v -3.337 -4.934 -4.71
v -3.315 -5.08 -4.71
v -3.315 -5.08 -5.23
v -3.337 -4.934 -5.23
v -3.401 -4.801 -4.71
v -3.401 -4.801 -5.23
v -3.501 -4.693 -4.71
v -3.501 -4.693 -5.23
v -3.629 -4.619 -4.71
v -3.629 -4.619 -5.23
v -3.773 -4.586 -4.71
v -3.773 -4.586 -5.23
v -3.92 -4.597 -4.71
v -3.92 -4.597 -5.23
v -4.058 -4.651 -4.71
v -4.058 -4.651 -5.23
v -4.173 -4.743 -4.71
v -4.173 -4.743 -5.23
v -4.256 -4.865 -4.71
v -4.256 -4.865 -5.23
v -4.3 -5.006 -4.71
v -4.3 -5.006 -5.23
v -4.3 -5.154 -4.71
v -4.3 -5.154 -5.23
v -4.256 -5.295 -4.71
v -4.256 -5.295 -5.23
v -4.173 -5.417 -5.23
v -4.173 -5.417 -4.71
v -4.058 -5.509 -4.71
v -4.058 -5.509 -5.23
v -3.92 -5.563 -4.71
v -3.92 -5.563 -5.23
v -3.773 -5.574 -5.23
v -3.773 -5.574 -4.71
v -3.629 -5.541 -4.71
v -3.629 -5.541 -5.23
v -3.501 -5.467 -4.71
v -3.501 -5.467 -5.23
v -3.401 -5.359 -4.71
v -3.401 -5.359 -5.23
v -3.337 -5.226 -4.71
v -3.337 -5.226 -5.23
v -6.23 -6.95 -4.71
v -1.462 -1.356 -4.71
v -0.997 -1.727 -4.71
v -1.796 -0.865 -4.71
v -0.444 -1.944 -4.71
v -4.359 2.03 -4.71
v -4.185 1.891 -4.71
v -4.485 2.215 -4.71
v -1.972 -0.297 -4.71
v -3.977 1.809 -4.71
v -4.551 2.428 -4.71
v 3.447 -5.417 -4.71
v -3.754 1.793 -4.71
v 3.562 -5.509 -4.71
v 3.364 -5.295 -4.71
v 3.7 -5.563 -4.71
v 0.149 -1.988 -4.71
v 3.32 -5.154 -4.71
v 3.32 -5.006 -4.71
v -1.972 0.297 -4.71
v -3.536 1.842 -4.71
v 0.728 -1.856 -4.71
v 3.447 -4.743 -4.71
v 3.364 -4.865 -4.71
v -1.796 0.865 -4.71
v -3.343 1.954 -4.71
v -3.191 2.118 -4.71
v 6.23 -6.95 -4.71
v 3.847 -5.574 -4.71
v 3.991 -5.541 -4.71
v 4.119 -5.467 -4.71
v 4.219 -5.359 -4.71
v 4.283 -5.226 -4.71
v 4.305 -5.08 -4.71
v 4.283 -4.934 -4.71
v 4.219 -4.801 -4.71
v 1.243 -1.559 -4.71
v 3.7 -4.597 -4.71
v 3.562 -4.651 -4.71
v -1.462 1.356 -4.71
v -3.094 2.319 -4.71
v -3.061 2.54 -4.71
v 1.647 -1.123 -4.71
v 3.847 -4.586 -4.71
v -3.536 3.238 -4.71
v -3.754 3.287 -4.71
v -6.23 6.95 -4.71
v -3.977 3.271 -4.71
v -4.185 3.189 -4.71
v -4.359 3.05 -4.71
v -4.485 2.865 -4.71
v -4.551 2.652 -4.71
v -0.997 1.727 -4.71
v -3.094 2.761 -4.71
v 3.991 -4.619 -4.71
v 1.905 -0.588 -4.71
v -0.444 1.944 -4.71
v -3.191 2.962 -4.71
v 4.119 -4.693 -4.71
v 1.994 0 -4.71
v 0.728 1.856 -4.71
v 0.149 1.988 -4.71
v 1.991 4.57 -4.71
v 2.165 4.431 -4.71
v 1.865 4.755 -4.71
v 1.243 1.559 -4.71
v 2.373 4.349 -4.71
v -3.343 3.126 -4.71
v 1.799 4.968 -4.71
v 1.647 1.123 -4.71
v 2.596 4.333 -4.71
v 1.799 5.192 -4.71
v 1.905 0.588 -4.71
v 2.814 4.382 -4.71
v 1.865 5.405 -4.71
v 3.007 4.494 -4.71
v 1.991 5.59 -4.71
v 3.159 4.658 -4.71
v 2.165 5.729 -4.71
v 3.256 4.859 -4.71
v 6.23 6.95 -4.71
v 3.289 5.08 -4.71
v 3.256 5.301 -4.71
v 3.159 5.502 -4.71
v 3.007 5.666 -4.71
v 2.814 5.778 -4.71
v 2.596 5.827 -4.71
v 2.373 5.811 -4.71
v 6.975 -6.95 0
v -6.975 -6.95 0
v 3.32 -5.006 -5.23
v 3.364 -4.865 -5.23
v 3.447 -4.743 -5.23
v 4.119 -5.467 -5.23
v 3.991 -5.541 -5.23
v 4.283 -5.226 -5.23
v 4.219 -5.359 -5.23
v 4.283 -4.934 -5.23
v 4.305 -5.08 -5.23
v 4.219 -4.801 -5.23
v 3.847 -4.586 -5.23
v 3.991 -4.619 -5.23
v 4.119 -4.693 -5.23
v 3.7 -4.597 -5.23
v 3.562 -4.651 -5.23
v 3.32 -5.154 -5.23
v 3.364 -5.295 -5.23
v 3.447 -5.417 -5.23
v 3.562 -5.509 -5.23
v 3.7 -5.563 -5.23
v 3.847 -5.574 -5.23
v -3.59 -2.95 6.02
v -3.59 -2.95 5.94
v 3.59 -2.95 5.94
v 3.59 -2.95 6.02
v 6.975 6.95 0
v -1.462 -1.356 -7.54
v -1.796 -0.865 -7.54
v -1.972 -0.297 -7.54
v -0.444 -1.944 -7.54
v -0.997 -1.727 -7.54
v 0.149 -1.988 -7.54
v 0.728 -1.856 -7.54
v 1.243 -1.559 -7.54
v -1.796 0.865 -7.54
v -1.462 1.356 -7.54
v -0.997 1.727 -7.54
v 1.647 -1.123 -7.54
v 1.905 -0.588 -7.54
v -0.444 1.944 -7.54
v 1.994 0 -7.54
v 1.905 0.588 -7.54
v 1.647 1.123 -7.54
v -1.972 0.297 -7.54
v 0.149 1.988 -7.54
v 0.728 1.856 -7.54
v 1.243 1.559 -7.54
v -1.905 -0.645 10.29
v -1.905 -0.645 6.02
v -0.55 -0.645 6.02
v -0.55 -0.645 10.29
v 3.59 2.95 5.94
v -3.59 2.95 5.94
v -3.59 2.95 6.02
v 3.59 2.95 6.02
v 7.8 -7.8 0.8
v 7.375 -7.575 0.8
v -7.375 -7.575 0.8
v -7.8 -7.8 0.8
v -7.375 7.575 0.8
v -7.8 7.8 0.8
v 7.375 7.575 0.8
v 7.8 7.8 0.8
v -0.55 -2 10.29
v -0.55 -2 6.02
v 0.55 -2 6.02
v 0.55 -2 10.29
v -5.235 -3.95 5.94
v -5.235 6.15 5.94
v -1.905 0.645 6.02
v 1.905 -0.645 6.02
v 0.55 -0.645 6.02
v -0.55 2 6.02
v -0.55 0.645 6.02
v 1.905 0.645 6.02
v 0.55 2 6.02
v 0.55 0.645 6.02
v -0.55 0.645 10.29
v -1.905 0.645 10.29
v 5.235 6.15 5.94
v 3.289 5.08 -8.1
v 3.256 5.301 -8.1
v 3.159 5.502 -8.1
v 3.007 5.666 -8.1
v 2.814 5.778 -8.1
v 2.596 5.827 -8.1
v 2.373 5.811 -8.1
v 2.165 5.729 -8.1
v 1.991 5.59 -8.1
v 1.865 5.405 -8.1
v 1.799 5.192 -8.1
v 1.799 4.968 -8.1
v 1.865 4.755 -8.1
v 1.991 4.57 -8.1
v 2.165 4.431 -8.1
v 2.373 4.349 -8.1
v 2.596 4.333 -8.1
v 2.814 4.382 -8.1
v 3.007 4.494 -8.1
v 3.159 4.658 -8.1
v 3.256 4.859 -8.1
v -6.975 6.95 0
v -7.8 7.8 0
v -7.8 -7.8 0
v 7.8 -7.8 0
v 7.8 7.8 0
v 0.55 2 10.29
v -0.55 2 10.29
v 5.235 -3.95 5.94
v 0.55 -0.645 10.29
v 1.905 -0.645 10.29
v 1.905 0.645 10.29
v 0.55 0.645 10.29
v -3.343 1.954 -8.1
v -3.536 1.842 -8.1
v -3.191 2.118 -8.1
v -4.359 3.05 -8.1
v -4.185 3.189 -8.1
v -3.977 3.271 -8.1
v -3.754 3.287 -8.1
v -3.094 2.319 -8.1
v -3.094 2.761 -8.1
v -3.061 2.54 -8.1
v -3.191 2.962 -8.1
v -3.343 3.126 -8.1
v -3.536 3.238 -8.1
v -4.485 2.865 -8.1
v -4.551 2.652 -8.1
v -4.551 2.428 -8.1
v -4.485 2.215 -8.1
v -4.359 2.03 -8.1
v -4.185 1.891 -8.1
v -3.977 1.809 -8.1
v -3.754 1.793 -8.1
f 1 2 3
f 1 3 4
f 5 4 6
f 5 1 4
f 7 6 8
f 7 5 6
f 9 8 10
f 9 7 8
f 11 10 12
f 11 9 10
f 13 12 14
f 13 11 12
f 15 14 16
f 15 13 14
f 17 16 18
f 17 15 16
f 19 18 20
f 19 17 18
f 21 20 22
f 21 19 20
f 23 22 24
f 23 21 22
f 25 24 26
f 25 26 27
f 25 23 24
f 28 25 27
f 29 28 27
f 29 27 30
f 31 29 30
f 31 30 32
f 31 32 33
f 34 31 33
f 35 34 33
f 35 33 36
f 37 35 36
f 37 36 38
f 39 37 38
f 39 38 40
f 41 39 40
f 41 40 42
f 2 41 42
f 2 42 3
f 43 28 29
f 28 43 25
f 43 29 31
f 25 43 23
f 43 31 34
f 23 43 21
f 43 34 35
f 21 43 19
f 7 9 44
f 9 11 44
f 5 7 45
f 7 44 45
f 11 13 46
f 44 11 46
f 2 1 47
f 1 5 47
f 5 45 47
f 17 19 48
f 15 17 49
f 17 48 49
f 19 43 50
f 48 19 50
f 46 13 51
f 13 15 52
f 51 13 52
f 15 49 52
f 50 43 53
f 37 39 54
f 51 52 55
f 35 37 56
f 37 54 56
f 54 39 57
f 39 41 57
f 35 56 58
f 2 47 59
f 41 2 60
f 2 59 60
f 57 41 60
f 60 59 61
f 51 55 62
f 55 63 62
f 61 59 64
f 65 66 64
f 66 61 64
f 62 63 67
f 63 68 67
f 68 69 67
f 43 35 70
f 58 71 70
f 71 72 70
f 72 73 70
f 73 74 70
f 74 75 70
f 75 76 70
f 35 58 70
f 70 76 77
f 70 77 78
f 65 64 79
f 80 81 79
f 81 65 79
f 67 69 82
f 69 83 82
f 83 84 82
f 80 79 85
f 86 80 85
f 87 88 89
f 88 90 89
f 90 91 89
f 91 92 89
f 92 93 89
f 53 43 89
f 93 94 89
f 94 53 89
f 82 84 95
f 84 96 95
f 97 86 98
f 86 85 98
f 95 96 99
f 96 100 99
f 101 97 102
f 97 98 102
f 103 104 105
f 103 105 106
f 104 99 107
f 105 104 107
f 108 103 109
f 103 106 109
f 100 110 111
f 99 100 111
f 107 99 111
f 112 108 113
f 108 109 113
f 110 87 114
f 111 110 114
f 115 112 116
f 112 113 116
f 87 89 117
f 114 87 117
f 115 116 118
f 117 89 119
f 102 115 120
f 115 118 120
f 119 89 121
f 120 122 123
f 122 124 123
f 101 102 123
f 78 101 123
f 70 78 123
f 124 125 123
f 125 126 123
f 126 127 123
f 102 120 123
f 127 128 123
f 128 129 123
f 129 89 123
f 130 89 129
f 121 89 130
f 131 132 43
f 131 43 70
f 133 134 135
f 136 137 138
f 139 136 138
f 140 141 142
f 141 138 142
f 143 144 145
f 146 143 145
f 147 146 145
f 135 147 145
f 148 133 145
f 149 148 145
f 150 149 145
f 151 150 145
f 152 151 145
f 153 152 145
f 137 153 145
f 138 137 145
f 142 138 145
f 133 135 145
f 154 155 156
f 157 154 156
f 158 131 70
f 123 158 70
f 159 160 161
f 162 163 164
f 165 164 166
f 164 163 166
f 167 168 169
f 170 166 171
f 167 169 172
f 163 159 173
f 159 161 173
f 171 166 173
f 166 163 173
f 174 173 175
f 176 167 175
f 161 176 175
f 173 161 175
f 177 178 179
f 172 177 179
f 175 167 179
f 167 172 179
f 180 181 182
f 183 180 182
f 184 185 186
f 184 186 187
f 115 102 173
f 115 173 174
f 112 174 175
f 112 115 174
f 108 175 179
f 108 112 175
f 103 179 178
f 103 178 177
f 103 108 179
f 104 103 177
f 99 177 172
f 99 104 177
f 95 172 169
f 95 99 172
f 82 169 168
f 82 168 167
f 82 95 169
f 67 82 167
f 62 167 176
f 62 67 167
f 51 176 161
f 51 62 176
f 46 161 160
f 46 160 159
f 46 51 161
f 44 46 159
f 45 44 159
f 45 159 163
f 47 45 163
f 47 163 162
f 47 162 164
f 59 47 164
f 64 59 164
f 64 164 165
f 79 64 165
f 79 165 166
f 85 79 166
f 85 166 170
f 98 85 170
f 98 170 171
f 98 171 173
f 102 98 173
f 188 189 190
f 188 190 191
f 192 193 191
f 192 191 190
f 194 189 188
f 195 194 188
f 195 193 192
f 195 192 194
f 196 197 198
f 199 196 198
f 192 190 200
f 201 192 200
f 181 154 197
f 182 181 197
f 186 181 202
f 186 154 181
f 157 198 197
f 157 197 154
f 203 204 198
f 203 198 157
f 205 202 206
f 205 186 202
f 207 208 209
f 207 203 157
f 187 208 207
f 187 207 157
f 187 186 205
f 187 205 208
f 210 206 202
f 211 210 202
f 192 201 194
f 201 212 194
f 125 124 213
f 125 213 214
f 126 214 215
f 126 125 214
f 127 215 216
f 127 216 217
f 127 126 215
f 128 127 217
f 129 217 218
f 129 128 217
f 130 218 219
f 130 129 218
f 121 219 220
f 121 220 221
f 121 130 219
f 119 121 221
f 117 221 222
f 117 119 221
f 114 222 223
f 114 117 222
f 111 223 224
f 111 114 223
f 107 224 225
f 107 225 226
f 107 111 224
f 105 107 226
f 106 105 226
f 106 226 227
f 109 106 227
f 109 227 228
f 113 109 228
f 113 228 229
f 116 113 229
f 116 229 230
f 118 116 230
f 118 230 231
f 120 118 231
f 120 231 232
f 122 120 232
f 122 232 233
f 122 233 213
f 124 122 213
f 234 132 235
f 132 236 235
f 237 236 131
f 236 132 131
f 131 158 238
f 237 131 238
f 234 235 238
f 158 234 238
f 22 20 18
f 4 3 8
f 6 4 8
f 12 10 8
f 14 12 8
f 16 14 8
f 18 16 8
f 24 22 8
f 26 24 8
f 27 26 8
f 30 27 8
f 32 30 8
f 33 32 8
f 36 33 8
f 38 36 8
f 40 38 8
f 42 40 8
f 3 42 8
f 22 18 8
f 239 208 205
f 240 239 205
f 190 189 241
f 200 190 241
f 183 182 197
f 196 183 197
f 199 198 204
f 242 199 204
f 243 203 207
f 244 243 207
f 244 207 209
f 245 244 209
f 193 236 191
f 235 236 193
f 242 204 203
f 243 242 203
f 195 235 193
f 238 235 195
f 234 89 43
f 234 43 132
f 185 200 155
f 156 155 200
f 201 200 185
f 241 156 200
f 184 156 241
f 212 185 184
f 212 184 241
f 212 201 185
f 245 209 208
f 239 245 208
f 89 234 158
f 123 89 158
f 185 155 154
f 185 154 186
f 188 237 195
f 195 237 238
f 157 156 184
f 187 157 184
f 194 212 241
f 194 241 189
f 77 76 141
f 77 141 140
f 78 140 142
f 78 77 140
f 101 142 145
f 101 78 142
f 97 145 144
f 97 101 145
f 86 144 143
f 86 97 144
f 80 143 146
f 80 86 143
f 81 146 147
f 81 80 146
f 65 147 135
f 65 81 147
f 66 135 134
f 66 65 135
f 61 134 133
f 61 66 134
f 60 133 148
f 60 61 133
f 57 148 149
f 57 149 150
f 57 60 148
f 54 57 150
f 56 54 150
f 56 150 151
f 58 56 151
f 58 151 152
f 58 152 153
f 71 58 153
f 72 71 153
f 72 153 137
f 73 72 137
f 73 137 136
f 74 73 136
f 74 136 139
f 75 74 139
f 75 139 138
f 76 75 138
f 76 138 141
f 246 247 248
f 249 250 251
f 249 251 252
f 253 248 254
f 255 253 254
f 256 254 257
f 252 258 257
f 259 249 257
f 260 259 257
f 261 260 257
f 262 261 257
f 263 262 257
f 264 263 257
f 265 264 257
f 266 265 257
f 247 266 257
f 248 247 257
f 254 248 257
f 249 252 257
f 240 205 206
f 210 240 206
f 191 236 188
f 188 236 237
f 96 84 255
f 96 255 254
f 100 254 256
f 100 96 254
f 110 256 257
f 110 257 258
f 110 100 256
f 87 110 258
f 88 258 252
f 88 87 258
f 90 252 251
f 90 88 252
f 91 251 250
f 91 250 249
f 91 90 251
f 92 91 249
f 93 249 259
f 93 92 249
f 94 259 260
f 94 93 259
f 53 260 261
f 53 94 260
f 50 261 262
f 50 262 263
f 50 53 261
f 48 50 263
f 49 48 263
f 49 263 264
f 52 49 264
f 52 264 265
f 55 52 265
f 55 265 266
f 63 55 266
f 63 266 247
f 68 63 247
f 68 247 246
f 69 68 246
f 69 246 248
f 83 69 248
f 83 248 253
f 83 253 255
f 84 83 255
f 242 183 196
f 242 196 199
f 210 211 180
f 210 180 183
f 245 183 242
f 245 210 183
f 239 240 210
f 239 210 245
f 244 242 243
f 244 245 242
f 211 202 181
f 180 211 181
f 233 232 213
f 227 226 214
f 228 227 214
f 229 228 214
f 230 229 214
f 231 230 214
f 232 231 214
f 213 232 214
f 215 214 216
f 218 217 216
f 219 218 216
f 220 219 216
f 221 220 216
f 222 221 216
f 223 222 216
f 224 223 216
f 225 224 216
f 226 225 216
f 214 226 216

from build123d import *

# Parameters (mm, degrees)
F4_DEPTH       = 10.29
F1_W           = 7.18
F1_H           = 5.9
F5_DEPTH       = 6.02
F1_W_2         = 14.75
F1_H_2         = 15.15
F1_W_3         = 10.47
F1_H_3         = 10.1
F6_DEPTH       = 5.94
F1_W_4         = 15.6
F1_H_4         = 15.6
F7_DEPTH       = 0.8
F8_DEPTH       = 7.801
F8_DEPTH_BACK  = 7.801
F9_DEPTH       = 7.801
F9_DEPTH_BACK  = 7.801
F0_W           = 13.95
F0_H           = 13.9
F0_R           = 0.4953
F0_R_2         = 0.7493
F0_R_3         = 1.9939
F10_DEPTH      = 4.71
F11_DEPTH      = 7.54
F12_DEPTH      = 8.1
F13_DEPTH      = 5.23
F14_DEPTH      = 7.801
F14_DEPTH_BACK = 7.801


with BuildPart() as f4:
    # F1 (on Top) → F4 (new body, through all)
    with BuildSketch(Plane.XY):
        Polygon((0.55, 2), (-0.55, 2), (-0.55, 0.645), (-1.905, 0.645), (-1.905, -0.645), (-0.55, -0.645), (-0.55, -2), (0.55, -2), (0.55, -0.645), (1.905, -0.645), (1.905, 0.645), (0.55, 0.645), align=None)
    extrude(amount=F4_DEPTH)

    # F1 (on Top) → F5 (join, through all)
    with BuildSketch(Plane.XY):
        Rectangle(F1_W, F1_H)
        Polygon((-0.55, 0.645), (-0.55, 2), (0.55, 2), (0.55, 0.645), (1.905, 0.645), (1.905, -0.645), (0.55, -0.645), (0.55, -2), (-0.55, -2), (-0.55, -0.645), (-1.905, -0.645), (-1.905, 0.645), align=None, mode=Mode.SUBTRACT)
    extrude(amount=F5_DEPTH)

    # F1 (on Top) → F6 (join, through all)
    with BuildSketch(Plane.XY):
        Rectangle(F1_W_2, F1_H_2)
        with Locations((0, 1.1)):
            Rectangle(F1_W_3, F1_H_3, mode=Mode.SUBTRACT)
        with Locations((0, 1.1)):
            Rectangle(F1_W_3, F1_H_3)
        Rectangle(F1_W, F1_H, mode=Mode.SUBTRACT)
    extrude(amount=F6_DEPTH)

    # F1 (on Top) → F7 (join, through all)
    with BuildSketch(Plane.XY):
        Rectangle(F1_W_4, F1_H_4)
        Rectangle(F1_W_2, F1_H_2, mode=Mode.SUBTRACT)
    extrude(amount=F7_DEPTH)

    # F2 (on Right) → F8 (cut, two sides)
    with BuildSketch(Plane.YZ) as f8_sk:
        Polygon((-7.8, 5.94), (-7.8, 0.8), (-7.575, 0.8), (-3.95, 5.94), align=None)
        Polygon((6.15, 5.94), (7.575, 0.8), (7.8, 0.8), (7.8, 5.94), align=None)
    extrude(amount=-F8_DEPTH, mode=Mode.SUBTRACT)
    extrude(f8_sk.sketch, amount=F8_DEPTH_BACK, mode=Mode.SUBTRACT)

    # F3 (on Front) → F9 (cut, two sides)
    with BuildSketch(Plane.XZ) as f9_sk:
        Polygon((-7.8, 5.94), (-7.8, 0.8), (-7.375, 0.8), (-5.235, 5.94), align=None)
        Polygon((5.235, 5.94), (7.375, 0.8), (7.8, 0.8), (7.8, 5.94), align=None)
    extrude(amount=-F9_DEPTH, mode=Mode.SUBTRACT)
    extrude(f9_sk.sketch, amount=F9_DEPTH_BACK, mode=Mode.SUBTRACT)

    # F0 (on Top) → F10 (join, through all)
    with BuildSketch(Plane.XY):
        Rectangle(F0_W, F0_H)
        with Locations((-3.81, -5.08)):
            Circle(F0_R, mode=Mode.SUBTRACT)
        with Locations((3.81, -5.08)):
            Circle(F0_R, mode=Mode.SUBTRACT)
        with Locations((-3.81, 2.54)):
            Circle(F0_R_2, mode=Mode.SUBTRACT)
        Circle(F0_R_3, mode=Mode.SUBTRACT)
        with Locations((2.54, 5.08)):
            Circle(F0_R_2, mode=Mode.SUBTRACT)
    extrude(amount=-F10_DEPTH)

    # F0 (on Top) → F11 (join, through all)
    with BuildSketch(Plane.XY):
        Circle(F0_R_3)
    extrude(amount=-F11_DEPTH)

    # F0 (on Top) → F12 (join, through all)
    with BuildSketch(Plane.XY):
        with Locations((-3.81, 2.54)):
            Circle(F0_R_2)
        with Locations((2.54, 5.08)):
            Circle(F0_R_2)
    extrude(amount=-F12_DEPTH)

    # F0 (on Top) → F13 (join, through all)
    with BuildSketch(Plane.XY):
        with Locations((3.81, -5.08)):
            Circle(F0_R)
        with Locations((-3.81, -5.08)):
            Circle(F0_R)
    extrude(amount=-F13_DEPTH)

    # F3 (on Front) → F14 (cut, two sides)
    with BuildSketch(Plane.XZ) as f14_sk:
        Polygon((-6.975, 0), (-7.8, 0), (-7.8, -4.71), (-6.23, -4.71), align=None)
        Polygon((7.8, 0), (6.975, 0), (6.23, -4.71), (7.8, -4.71), align=None)
    extrude(amount=-F14_DEPTH, mode=Mode.SUBTRACT)
    extrude(f14_sk.sketch, amount=F14_DEPTH_BACK, mode=Mode.SUBTRACT)


solid = f4.part
